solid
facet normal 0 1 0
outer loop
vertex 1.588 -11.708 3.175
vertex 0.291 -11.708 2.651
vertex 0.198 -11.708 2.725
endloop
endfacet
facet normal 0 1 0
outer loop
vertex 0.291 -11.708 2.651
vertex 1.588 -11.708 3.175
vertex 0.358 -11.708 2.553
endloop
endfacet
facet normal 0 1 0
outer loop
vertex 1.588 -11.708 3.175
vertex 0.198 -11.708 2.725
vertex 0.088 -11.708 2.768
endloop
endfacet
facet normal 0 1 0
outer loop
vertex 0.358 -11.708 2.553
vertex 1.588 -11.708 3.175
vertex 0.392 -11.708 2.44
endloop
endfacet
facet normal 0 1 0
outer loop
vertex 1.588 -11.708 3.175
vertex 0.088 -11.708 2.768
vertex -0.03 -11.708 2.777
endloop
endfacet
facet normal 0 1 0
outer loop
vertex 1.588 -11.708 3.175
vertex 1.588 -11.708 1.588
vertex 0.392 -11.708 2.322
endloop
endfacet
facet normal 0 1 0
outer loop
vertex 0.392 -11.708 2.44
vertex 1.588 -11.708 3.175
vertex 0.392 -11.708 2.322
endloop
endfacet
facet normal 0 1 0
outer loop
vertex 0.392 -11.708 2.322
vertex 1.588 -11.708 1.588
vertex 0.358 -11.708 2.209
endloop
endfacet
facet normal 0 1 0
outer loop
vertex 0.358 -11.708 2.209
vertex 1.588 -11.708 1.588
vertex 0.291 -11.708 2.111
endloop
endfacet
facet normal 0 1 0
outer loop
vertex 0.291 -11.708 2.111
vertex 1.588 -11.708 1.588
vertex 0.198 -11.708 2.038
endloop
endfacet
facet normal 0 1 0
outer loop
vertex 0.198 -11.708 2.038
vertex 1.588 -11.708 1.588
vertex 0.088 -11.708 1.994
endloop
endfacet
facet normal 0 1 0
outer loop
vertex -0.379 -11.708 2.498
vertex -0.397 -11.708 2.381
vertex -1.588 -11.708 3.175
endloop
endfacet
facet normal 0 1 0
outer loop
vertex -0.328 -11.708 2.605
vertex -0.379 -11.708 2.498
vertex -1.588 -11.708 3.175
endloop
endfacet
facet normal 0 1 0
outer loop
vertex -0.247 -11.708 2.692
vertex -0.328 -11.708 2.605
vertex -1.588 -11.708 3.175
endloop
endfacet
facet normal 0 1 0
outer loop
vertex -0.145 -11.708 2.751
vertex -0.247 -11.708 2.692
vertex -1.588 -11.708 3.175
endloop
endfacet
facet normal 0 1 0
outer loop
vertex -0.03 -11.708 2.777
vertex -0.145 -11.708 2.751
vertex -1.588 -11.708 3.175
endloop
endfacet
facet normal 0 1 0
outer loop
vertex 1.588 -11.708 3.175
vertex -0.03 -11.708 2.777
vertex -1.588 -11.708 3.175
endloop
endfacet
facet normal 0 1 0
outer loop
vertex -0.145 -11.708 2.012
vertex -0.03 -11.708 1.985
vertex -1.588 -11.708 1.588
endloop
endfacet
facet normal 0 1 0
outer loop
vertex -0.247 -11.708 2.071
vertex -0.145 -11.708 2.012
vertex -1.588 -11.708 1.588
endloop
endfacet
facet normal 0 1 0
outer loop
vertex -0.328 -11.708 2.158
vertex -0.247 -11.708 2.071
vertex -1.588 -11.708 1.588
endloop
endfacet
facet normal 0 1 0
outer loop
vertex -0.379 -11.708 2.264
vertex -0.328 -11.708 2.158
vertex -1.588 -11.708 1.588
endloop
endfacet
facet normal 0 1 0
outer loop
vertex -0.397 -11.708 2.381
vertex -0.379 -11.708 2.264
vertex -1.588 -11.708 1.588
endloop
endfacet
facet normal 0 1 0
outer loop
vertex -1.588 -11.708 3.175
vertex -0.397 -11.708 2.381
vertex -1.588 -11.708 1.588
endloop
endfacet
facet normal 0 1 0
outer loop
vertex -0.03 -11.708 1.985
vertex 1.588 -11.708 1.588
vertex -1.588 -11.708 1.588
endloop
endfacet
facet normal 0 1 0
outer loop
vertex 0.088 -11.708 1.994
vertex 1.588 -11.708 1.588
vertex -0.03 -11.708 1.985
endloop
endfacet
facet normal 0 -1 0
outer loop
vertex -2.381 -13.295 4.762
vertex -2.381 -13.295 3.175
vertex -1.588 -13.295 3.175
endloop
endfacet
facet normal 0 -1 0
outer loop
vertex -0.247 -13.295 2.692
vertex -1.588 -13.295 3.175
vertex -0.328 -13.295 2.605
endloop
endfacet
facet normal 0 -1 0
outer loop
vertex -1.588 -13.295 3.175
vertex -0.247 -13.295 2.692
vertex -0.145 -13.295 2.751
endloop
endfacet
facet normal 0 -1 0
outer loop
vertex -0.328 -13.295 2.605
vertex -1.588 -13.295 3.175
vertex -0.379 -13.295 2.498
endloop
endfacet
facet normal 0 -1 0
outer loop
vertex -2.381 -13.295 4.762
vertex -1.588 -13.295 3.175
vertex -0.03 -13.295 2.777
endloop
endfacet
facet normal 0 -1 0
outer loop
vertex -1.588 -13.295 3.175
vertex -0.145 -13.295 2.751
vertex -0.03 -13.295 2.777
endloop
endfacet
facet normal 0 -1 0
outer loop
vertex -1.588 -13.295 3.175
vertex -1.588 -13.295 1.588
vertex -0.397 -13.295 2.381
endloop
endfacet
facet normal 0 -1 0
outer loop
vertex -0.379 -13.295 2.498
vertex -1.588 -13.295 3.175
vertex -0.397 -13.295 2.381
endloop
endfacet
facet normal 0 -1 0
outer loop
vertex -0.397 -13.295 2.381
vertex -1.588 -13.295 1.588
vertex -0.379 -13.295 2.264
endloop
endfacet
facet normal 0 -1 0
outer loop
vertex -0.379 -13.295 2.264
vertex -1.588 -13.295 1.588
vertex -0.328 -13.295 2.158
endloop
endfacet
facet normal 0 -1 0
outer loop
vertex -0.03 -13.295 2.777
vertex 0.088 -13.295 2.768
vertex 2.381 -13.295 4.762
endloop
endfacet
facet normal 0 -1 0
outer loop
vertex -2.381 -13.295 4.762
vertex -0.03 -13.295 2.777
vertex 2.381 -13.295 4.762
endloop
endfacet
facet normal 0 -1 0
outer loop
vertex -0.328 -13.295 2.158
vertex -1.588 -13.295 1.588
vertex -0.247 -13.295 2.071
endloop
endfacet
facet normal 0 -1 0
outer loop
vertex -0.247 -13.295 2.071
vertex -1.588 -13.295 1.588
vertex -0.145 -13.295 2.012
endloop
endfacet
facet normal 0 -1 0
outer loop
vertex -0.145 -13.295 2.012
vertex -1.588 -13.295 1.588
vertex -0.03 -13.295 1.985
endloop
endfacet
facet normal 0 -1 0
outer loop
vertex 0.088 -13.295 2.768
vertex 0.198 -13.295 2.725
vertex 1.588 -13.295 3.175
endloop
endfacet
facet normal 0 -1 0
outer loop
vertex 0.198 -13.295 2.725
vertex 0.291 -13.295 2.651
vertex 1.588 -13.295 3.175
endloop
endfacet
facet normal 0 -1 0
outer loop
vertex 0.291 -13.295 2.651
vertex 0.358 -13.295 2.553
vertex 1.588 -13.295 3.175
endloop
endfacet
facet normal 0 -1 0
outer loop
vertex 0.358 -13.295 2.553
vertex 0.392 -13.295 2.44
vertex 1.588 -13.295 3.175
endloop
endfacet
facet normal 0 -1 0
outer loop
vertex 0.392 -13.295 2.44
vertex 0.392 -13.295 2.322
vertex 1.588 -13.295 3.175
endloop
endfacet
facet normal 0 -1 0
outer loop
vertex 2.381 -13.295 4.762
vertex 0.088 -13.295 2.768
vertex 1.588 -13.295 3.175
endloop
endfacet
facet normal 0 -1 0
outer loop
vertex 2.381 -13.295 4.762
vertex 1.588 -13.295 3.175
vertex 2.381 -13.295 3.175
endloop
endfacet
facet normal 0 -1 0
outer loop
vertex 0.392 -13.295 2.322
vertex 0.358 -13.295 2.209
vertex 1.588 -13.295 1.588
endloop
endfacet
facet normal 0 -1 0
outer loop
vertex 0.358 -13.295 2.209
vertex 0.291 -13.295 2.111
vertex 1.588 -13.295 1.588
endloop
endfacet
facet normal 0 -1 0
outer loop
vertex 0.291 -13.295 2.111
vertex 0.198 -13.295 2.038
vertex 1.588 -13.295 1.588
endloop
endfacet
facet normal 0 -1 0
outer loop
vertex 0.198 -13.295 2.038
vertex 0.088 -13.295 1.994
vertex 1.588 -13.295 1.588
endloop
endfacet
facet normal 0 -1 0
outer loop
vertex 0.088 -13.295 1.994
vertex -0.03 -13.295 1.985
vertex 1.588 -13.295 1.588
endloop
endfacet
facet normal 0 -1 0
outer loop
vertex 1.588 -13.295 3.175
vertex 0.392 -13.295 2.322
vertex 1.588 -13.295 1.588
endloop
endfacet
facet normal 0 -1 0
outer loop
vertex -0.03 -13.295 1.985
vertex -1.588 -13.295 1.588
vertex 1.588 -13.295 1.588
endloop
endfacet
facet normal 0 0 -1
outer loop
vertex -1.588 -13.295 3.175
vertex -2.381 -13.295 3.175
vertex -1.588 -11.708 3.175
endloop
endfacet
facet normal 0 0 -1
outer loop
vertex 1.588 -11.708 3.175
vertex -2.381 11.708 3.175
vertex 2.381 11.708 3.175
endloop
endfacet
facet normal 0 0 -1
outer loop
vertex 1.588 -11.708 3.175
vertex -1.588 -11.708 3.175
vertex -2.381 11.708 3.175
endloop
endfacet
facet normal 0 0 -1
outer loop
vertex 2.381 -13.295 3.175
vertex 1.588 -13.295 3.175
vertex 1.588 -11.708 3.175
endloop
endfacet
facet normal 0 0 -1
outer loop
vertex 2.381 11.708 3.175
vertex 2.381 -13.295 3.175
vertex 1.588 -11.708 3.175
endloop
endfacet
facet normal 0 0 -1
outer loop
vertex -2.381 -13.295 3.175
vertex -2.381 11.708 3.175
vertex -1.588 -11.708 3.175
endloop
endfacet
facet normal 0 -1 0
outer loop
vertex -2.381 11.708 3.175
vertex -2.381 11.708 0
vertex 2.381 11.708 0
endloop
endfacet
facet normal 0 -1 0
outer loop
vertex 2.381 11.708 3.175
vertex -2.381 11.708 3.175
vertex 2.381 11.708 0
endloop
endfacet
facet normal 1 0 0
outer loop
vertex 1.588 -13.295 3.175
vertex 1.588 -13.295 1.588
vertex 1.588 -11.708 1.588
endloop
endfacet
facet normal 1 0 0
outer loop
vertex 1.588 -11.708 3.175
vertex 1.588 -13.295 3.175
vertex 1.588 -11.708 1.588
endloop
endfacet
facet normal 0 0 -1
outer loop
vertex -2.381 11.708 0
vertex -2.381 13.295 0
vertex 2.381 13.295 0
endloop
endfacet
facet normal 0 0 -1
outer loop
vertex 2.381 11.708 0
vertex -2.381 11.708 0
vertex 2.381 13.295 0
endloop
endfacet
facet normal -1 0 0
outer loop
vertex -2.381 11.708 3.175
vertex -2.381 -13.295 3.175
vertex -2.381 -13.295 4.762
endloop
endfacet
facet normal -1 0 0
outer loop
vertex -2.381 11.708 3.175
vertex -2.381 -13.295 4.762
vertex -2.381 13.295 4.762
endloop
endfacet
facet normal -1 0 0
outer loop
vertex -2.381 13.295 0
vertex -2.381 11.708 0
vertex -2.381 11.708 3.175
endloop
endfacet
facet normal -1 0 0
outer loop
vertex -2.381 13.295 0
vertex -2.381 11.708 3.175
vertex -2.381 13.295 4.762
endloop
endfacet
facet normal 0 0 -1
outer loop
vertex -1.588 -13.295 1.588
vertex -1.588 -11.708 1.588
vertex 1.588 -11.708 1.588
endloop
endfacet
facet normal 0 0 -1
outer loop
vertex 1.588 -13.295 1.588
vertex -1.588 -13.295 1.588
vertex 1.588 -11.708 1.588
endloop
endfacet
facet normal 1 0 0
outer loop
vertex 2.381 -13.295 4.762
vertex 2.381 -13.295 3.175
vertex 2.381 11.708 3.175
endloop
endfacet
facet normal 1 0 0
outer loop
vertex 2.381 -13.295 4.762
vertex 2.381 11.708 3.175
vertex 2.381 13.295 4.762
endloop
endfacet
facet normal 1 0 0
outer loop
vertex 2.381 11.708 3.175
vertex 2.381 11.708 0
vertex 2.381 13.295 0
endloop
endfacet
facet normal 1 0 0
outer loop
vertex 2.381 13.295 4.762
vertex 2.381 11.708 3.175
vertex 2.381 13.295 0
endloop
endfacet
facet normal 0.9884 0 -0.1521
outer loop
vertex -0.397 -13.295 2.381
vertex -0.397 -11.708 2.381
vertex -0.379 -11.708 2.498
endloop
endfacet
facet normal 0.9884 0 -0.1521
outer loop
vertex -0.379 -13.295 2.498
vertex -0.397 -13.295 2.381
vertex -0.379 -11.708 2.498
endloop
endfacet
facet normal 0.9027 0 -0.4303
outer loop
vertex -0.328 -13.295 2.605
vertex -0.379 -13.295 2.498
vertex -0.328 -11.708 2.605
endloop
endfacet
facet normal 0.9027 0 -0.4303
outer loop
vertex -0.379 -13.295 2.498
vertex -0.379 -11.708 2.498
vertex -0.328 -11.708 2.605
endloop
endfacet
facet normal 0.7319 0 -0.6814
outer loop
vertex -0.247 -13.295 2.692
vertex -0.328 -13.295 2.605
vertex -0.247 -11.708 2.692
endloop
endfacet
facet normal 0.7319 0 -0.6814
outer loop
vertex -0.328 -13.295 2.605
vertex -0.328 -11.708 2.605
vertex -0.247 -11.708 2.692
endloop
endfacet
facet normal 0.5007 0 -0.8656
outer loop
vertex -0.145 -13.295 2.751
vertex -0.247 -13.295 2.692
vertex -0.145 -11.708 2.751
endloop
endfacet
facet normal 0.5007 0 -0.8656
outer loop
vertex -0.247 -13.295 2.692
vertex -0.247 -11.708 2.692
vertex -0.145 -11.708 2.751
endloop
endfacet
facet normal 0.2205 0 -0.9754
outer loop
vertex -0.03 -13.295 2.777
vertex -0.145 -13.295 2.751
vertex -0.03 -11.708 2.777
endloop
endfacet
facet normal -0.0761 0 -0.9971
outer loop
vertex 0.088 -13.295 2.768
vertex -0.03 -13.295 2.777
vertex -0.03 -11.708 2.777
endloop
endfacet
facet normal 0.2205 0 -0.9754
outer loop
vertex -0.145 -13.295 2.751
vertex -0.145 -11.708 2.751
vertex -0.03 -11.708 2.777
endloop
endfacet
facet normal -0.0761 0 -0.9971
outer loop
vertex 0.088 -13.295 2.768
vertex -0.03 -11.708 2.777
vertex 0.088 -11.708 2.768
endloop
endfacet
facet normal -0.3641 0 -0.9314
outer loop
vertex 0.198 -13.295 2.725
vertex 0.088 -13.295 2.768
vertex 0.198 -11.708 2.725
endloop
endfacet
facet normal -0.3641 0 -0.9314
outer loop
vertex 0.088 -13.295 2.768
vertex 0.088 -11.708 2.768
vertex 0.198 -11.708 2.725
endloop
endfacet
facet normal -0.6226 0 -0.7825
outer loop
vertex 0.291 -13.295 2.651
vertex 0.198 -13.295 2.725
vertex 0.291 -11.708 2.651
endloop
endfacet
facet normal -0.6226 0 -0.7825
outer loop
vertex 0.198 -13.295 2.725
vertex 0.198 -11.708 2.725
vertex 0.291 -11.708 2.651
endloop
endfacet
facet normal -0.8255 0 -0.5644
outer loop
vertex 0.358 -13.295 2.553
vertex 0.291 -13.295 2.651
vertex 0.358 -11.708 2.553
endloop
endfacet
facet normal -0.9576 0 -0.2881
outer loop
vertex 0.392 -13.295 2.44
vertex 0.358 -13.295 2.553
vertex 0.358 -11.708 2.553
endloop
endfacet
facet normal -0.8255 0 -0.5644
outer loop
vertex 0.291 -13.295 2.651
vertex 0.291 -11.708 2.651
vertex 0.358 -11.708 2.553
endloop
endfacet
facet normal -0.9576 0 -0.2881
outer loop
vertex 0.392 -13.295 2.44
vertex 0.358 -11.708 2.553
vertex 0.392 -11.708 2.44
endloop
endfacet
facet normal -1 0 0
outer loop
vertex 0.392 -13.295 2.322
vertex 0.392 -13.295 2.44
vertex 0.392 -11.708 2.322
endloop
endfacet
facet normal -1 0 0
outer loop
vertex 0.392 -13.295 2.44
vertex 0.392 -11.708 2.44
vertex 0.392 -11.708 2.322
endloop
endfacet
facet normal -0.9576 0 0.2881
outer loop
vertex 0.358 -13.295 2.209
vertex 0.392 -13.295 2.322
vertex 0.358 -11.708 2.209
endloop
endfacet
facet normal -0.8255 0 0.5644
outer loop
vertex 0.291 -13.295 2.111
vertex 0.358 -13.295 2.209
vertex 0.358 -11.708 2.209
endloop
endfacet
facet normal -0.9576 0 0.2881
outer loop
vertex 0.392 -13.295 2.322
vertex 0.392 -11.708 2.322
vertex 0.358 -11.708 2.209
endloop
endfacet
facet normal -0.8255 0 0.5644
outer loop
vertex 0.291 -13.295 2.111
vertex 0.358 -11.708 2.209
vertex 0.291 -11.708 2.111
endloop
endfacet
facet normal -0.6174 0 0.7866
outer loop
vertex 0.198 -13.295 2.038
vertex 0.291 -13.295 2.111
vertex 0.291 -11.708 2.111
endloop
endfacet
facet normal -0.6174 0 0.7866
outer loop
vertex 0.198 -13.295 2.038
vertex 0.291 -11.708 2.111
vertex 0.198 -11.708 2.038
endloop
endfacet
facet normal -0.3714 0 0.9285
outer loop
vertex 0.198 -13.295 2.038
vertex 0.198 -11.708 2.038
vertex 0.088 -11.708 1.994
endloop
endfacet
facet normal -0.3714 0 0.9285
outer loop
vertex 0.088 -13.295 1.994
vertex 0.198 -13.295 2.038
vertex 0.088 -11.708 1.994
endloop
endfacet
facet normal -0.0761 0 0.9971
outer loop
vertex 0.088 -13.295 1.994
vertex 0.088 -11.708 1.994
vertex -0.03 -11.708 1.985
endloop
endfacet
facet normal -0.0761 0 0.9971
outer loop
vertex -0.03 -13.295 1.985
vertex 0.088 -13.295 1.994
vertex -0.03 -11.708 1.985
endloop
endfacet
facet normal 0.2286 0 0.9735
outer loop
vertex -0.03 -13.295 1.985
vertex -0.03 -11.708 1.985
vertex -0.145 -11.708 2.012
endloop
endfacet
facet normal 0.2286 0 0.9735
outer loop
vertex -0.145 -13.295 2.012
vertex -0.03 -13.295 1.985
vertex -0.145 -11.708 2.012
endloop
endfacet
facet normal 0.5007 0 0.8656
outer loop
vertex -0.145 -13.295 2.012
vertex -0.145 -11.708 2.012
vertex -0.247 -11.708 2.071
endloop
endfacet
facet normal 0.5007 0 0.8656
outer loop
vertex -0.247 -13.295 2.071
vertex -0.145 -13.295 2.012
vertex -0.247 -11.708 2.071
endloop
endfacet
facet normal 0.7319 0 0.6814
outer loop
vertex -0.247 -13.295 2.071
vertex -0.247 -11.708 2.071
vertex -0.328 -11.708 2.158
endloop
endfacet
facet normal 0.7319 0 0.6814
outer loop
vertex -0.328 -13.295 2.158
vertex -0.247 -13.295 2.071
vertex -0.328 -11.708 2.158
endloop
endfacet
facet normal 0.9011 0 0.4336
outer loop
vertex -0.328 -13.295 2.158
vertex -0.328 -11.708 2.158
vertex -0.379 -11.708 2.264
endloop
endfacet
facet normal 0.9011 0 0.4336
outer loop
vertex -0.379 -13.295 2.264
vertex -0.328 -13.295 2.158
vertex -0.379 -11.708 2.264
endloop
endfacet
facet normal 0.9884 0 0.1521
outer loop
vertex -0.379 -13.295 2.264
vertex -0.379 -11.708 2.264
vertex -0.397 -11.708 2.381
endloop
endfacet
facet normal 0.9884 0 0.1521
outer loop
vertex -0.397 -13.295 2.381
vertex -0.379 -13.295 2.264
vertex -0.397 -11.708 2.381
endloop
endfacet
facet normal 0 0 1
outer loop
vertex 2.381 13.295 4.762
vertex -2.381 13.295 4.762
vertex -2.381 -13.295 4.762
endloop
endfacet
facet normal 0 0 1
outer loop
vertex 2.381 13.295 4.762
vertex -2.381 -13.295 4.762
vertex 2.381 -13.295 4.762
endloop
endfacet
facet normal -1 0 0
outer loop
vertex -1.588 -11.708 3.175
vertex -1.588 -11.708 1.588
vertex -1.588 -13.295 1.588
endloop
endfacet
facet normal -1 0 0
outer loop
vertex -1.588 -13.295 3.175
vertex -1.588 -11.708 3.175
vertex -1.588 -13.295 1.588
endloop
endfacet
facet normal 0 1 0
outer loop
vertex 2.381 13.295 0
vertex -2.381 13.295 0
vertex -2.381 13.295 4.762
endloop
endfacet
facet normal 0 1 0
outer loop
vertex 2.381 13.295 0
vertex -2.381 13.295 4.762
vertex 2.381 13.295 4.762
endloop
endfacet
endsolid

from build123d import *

# Parameters (mm, degrees)
F0_W     = 4.7625
F0_H     = 26.590625
F1_DEPTH = 4.7625
F3_DEPTH = 3.175
F4_DEPTH = 1.5875
F5_R     = 0.396875
F6_DEPTH = 1.5885


with BuildPart() as f1:
    # F0 (on Top) → F1 (new body)
    with BuildSketch(Plane.XY):
        Rectangle(F0_W, F0_H)
    extrude(amount=F1_DEPTH)

    # F2 (on face) → F3 (cut)
    with BuildSketch(Plane(origin=(0, 0, 0), x_dir=(1, 0, 0), z_dir=(0, 0, -1))):
        Polygon((-2.38125, -11.7078125), (2.38125, -11.7078125), (2.38125, 13.2953125), (1.5875, 13.2953125), (1.5875, 11.7078125), (-1.5875, 11.7078125), (-1.5875, 13.2953125), (-2.38125, 13.2953125), align=None)
    extrude(amount=-F3_DEPTH, mode=Mode.SUBTRACT)

    # F4 (cut): a face of the model
    f4_faces = [f1.faces().sort_by_distance(p)[0] for p in [
        (0, -12.5015625, 0),
    ]]
    extrude(f4_faces, amount=-F4_DEPTH, mode=Mode.SUBTRACT)

    # F5 (on face) → F6 (cut, through all)
    with BuildSketch(Plane(origin=(0, -11.7078125, 0), x_dir=(-1, 0, 0), z_dir=(0, 1, 0))):
        with Locations((0, 2.38125)):
            Circle(F5_R)
    extrude(amount=-F6_DEPTH, mode=Mode.SUBTRACT)


solid = f1.part
